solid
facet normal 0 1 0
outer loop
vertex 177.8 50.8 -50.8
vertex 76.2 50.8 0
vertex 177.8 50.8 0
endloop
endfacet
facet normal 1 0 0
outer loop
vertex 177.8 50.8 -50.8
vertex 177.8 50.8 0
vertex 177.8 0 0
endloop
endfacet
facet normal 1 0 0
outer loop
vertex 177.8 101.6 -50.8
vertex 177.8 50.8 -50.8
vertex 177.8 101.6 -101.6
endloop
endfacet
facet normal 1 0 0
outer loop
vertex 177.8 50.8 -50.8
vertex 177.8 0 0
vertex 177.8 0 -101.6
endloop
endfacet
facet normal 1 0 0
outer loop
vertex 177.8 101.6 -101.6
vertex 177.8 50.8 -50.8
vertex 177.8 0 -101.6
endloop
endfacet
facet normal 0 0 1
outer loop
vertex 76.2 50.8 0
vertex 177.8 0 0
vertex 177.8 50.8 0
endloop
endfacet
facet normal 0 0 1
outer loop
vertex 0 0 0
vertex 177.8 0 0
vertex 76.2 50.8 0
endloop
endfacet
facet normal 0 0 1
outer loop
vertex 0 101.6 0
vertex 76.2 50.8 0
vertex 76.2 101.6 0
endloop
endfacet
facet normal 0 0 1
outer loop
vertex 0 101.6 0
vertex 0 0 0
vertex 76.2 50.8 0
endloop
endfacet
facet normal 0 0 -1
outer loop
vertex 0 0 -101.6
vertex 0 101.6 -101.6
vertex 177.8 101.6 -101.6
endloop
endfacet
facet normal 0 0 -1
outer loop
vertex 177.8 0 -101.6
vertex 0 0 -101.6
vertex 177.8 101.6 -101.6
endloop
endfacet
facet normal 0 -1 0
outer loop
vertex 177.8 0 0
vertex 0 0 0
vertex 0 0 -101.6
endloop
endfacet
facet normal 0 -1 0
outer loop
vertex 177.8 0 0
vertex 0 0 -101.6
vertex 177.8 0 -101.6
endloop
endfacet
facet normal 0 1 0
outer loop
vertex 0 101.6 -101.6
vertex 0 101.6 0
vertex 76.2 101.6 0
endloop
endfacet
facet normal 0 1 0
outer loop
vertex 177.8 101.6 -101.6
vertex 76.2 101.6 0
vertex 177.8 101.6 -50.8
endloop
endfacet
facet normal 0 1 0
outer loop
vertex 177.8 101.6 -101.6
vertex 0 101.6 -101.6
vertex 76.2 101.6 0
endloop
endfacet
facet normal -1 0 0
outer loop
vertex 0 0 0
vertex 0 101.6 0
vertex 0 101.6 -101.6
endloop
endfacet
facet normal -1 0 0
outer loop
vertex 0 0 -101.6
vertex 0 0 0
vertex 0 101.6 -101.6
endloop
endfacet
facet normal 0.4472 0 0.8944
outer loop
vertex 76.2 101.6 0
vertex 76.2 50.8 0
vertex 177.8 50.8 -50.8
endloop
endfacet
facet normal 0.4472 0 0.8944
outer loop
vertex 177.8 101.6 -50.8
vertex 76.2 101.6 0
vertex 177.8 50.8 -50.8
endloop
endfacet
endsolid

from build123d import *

# Parameters (mm, degrees)
SKETCH1_W           = 177.8
SKETCH1_H           = 50.8
BOSS_EXTRUDE2_DEPTH = 101.6
SKETCH5_W           = 101.6
SKETCH5_H           = 50.8
BOSS_EXTRUDE3_DEPTH = 76.2
BOSS_EXTRUDE4_DEPTH = 50.8
BOSS_EXTRUDE5_REACH = 103.6
SKETCH6_W           = 101.6
SKETCH6_H           = 50.8


with BuildPart() as part:
    # Sketch1 → Boss-Extrude2 (new body)
    with BuildSketch(Plane.XY):
        with Locations((88.9, 25.4)):
            Rectangle(SKETCH1_W, SKETCH1_H)
    extrude(amount=-BOSS_EXTRUDE2_DEPTH)

    # Sketch5 → Boss-Extrude3 (add)
    with BuildSketch(Plane(origin=(0, 0, 0), x_dir=(0, 0, -1), z_dir=(1, 0, 0))):
        with Locations((50.8, 76.2)):
            Rectangle(SKETCH5_W, SKETCH5_H)
    extrude(amount=BOSS_EXTRUDE3_DEPTH)

    # Sketch4 → Boss-Extrude4 (add)
    with BuildSketch(Plane(origin=(0, 50.8, 0), x_dir=(1, 0, 0), z_dir=(0, 1, 0))):
        Polygon((76.2, 50.8), (76.2, 0), (177.8, 50.8), (177.8, 101.6), (177.395806452, 101.6), (177.395806452, 50.8), align=None)
    extrude(amount=BOSS_EXTRUDE4_DEPTH)

    # Sketch6 → Boss-Extrude5 (add, up to next)
    with BuildSketch(Plane(origin=(76.2, 101.6, -101.6), x_dir=(1, 0, 0), z_dir=(0, 0, 1)), mode=Mode.PRIVATE) as boss_extrude5_sk1:
        with Locations((50.8, -25.4)):
            Rectangle(SKETCH6_W, SKETCH6_H)
    boss_extrude5_tool1 = extrude(boss_extrude5_sk1.sketch, amount=BOSS_EXTRUDE5_REACH, mode=Mode.PRIVATE) - part.part
    add(boss_extrude5_tool1.solids().sort_by_distance((127, 76.2, -101.6))[0])


solid = part.part
